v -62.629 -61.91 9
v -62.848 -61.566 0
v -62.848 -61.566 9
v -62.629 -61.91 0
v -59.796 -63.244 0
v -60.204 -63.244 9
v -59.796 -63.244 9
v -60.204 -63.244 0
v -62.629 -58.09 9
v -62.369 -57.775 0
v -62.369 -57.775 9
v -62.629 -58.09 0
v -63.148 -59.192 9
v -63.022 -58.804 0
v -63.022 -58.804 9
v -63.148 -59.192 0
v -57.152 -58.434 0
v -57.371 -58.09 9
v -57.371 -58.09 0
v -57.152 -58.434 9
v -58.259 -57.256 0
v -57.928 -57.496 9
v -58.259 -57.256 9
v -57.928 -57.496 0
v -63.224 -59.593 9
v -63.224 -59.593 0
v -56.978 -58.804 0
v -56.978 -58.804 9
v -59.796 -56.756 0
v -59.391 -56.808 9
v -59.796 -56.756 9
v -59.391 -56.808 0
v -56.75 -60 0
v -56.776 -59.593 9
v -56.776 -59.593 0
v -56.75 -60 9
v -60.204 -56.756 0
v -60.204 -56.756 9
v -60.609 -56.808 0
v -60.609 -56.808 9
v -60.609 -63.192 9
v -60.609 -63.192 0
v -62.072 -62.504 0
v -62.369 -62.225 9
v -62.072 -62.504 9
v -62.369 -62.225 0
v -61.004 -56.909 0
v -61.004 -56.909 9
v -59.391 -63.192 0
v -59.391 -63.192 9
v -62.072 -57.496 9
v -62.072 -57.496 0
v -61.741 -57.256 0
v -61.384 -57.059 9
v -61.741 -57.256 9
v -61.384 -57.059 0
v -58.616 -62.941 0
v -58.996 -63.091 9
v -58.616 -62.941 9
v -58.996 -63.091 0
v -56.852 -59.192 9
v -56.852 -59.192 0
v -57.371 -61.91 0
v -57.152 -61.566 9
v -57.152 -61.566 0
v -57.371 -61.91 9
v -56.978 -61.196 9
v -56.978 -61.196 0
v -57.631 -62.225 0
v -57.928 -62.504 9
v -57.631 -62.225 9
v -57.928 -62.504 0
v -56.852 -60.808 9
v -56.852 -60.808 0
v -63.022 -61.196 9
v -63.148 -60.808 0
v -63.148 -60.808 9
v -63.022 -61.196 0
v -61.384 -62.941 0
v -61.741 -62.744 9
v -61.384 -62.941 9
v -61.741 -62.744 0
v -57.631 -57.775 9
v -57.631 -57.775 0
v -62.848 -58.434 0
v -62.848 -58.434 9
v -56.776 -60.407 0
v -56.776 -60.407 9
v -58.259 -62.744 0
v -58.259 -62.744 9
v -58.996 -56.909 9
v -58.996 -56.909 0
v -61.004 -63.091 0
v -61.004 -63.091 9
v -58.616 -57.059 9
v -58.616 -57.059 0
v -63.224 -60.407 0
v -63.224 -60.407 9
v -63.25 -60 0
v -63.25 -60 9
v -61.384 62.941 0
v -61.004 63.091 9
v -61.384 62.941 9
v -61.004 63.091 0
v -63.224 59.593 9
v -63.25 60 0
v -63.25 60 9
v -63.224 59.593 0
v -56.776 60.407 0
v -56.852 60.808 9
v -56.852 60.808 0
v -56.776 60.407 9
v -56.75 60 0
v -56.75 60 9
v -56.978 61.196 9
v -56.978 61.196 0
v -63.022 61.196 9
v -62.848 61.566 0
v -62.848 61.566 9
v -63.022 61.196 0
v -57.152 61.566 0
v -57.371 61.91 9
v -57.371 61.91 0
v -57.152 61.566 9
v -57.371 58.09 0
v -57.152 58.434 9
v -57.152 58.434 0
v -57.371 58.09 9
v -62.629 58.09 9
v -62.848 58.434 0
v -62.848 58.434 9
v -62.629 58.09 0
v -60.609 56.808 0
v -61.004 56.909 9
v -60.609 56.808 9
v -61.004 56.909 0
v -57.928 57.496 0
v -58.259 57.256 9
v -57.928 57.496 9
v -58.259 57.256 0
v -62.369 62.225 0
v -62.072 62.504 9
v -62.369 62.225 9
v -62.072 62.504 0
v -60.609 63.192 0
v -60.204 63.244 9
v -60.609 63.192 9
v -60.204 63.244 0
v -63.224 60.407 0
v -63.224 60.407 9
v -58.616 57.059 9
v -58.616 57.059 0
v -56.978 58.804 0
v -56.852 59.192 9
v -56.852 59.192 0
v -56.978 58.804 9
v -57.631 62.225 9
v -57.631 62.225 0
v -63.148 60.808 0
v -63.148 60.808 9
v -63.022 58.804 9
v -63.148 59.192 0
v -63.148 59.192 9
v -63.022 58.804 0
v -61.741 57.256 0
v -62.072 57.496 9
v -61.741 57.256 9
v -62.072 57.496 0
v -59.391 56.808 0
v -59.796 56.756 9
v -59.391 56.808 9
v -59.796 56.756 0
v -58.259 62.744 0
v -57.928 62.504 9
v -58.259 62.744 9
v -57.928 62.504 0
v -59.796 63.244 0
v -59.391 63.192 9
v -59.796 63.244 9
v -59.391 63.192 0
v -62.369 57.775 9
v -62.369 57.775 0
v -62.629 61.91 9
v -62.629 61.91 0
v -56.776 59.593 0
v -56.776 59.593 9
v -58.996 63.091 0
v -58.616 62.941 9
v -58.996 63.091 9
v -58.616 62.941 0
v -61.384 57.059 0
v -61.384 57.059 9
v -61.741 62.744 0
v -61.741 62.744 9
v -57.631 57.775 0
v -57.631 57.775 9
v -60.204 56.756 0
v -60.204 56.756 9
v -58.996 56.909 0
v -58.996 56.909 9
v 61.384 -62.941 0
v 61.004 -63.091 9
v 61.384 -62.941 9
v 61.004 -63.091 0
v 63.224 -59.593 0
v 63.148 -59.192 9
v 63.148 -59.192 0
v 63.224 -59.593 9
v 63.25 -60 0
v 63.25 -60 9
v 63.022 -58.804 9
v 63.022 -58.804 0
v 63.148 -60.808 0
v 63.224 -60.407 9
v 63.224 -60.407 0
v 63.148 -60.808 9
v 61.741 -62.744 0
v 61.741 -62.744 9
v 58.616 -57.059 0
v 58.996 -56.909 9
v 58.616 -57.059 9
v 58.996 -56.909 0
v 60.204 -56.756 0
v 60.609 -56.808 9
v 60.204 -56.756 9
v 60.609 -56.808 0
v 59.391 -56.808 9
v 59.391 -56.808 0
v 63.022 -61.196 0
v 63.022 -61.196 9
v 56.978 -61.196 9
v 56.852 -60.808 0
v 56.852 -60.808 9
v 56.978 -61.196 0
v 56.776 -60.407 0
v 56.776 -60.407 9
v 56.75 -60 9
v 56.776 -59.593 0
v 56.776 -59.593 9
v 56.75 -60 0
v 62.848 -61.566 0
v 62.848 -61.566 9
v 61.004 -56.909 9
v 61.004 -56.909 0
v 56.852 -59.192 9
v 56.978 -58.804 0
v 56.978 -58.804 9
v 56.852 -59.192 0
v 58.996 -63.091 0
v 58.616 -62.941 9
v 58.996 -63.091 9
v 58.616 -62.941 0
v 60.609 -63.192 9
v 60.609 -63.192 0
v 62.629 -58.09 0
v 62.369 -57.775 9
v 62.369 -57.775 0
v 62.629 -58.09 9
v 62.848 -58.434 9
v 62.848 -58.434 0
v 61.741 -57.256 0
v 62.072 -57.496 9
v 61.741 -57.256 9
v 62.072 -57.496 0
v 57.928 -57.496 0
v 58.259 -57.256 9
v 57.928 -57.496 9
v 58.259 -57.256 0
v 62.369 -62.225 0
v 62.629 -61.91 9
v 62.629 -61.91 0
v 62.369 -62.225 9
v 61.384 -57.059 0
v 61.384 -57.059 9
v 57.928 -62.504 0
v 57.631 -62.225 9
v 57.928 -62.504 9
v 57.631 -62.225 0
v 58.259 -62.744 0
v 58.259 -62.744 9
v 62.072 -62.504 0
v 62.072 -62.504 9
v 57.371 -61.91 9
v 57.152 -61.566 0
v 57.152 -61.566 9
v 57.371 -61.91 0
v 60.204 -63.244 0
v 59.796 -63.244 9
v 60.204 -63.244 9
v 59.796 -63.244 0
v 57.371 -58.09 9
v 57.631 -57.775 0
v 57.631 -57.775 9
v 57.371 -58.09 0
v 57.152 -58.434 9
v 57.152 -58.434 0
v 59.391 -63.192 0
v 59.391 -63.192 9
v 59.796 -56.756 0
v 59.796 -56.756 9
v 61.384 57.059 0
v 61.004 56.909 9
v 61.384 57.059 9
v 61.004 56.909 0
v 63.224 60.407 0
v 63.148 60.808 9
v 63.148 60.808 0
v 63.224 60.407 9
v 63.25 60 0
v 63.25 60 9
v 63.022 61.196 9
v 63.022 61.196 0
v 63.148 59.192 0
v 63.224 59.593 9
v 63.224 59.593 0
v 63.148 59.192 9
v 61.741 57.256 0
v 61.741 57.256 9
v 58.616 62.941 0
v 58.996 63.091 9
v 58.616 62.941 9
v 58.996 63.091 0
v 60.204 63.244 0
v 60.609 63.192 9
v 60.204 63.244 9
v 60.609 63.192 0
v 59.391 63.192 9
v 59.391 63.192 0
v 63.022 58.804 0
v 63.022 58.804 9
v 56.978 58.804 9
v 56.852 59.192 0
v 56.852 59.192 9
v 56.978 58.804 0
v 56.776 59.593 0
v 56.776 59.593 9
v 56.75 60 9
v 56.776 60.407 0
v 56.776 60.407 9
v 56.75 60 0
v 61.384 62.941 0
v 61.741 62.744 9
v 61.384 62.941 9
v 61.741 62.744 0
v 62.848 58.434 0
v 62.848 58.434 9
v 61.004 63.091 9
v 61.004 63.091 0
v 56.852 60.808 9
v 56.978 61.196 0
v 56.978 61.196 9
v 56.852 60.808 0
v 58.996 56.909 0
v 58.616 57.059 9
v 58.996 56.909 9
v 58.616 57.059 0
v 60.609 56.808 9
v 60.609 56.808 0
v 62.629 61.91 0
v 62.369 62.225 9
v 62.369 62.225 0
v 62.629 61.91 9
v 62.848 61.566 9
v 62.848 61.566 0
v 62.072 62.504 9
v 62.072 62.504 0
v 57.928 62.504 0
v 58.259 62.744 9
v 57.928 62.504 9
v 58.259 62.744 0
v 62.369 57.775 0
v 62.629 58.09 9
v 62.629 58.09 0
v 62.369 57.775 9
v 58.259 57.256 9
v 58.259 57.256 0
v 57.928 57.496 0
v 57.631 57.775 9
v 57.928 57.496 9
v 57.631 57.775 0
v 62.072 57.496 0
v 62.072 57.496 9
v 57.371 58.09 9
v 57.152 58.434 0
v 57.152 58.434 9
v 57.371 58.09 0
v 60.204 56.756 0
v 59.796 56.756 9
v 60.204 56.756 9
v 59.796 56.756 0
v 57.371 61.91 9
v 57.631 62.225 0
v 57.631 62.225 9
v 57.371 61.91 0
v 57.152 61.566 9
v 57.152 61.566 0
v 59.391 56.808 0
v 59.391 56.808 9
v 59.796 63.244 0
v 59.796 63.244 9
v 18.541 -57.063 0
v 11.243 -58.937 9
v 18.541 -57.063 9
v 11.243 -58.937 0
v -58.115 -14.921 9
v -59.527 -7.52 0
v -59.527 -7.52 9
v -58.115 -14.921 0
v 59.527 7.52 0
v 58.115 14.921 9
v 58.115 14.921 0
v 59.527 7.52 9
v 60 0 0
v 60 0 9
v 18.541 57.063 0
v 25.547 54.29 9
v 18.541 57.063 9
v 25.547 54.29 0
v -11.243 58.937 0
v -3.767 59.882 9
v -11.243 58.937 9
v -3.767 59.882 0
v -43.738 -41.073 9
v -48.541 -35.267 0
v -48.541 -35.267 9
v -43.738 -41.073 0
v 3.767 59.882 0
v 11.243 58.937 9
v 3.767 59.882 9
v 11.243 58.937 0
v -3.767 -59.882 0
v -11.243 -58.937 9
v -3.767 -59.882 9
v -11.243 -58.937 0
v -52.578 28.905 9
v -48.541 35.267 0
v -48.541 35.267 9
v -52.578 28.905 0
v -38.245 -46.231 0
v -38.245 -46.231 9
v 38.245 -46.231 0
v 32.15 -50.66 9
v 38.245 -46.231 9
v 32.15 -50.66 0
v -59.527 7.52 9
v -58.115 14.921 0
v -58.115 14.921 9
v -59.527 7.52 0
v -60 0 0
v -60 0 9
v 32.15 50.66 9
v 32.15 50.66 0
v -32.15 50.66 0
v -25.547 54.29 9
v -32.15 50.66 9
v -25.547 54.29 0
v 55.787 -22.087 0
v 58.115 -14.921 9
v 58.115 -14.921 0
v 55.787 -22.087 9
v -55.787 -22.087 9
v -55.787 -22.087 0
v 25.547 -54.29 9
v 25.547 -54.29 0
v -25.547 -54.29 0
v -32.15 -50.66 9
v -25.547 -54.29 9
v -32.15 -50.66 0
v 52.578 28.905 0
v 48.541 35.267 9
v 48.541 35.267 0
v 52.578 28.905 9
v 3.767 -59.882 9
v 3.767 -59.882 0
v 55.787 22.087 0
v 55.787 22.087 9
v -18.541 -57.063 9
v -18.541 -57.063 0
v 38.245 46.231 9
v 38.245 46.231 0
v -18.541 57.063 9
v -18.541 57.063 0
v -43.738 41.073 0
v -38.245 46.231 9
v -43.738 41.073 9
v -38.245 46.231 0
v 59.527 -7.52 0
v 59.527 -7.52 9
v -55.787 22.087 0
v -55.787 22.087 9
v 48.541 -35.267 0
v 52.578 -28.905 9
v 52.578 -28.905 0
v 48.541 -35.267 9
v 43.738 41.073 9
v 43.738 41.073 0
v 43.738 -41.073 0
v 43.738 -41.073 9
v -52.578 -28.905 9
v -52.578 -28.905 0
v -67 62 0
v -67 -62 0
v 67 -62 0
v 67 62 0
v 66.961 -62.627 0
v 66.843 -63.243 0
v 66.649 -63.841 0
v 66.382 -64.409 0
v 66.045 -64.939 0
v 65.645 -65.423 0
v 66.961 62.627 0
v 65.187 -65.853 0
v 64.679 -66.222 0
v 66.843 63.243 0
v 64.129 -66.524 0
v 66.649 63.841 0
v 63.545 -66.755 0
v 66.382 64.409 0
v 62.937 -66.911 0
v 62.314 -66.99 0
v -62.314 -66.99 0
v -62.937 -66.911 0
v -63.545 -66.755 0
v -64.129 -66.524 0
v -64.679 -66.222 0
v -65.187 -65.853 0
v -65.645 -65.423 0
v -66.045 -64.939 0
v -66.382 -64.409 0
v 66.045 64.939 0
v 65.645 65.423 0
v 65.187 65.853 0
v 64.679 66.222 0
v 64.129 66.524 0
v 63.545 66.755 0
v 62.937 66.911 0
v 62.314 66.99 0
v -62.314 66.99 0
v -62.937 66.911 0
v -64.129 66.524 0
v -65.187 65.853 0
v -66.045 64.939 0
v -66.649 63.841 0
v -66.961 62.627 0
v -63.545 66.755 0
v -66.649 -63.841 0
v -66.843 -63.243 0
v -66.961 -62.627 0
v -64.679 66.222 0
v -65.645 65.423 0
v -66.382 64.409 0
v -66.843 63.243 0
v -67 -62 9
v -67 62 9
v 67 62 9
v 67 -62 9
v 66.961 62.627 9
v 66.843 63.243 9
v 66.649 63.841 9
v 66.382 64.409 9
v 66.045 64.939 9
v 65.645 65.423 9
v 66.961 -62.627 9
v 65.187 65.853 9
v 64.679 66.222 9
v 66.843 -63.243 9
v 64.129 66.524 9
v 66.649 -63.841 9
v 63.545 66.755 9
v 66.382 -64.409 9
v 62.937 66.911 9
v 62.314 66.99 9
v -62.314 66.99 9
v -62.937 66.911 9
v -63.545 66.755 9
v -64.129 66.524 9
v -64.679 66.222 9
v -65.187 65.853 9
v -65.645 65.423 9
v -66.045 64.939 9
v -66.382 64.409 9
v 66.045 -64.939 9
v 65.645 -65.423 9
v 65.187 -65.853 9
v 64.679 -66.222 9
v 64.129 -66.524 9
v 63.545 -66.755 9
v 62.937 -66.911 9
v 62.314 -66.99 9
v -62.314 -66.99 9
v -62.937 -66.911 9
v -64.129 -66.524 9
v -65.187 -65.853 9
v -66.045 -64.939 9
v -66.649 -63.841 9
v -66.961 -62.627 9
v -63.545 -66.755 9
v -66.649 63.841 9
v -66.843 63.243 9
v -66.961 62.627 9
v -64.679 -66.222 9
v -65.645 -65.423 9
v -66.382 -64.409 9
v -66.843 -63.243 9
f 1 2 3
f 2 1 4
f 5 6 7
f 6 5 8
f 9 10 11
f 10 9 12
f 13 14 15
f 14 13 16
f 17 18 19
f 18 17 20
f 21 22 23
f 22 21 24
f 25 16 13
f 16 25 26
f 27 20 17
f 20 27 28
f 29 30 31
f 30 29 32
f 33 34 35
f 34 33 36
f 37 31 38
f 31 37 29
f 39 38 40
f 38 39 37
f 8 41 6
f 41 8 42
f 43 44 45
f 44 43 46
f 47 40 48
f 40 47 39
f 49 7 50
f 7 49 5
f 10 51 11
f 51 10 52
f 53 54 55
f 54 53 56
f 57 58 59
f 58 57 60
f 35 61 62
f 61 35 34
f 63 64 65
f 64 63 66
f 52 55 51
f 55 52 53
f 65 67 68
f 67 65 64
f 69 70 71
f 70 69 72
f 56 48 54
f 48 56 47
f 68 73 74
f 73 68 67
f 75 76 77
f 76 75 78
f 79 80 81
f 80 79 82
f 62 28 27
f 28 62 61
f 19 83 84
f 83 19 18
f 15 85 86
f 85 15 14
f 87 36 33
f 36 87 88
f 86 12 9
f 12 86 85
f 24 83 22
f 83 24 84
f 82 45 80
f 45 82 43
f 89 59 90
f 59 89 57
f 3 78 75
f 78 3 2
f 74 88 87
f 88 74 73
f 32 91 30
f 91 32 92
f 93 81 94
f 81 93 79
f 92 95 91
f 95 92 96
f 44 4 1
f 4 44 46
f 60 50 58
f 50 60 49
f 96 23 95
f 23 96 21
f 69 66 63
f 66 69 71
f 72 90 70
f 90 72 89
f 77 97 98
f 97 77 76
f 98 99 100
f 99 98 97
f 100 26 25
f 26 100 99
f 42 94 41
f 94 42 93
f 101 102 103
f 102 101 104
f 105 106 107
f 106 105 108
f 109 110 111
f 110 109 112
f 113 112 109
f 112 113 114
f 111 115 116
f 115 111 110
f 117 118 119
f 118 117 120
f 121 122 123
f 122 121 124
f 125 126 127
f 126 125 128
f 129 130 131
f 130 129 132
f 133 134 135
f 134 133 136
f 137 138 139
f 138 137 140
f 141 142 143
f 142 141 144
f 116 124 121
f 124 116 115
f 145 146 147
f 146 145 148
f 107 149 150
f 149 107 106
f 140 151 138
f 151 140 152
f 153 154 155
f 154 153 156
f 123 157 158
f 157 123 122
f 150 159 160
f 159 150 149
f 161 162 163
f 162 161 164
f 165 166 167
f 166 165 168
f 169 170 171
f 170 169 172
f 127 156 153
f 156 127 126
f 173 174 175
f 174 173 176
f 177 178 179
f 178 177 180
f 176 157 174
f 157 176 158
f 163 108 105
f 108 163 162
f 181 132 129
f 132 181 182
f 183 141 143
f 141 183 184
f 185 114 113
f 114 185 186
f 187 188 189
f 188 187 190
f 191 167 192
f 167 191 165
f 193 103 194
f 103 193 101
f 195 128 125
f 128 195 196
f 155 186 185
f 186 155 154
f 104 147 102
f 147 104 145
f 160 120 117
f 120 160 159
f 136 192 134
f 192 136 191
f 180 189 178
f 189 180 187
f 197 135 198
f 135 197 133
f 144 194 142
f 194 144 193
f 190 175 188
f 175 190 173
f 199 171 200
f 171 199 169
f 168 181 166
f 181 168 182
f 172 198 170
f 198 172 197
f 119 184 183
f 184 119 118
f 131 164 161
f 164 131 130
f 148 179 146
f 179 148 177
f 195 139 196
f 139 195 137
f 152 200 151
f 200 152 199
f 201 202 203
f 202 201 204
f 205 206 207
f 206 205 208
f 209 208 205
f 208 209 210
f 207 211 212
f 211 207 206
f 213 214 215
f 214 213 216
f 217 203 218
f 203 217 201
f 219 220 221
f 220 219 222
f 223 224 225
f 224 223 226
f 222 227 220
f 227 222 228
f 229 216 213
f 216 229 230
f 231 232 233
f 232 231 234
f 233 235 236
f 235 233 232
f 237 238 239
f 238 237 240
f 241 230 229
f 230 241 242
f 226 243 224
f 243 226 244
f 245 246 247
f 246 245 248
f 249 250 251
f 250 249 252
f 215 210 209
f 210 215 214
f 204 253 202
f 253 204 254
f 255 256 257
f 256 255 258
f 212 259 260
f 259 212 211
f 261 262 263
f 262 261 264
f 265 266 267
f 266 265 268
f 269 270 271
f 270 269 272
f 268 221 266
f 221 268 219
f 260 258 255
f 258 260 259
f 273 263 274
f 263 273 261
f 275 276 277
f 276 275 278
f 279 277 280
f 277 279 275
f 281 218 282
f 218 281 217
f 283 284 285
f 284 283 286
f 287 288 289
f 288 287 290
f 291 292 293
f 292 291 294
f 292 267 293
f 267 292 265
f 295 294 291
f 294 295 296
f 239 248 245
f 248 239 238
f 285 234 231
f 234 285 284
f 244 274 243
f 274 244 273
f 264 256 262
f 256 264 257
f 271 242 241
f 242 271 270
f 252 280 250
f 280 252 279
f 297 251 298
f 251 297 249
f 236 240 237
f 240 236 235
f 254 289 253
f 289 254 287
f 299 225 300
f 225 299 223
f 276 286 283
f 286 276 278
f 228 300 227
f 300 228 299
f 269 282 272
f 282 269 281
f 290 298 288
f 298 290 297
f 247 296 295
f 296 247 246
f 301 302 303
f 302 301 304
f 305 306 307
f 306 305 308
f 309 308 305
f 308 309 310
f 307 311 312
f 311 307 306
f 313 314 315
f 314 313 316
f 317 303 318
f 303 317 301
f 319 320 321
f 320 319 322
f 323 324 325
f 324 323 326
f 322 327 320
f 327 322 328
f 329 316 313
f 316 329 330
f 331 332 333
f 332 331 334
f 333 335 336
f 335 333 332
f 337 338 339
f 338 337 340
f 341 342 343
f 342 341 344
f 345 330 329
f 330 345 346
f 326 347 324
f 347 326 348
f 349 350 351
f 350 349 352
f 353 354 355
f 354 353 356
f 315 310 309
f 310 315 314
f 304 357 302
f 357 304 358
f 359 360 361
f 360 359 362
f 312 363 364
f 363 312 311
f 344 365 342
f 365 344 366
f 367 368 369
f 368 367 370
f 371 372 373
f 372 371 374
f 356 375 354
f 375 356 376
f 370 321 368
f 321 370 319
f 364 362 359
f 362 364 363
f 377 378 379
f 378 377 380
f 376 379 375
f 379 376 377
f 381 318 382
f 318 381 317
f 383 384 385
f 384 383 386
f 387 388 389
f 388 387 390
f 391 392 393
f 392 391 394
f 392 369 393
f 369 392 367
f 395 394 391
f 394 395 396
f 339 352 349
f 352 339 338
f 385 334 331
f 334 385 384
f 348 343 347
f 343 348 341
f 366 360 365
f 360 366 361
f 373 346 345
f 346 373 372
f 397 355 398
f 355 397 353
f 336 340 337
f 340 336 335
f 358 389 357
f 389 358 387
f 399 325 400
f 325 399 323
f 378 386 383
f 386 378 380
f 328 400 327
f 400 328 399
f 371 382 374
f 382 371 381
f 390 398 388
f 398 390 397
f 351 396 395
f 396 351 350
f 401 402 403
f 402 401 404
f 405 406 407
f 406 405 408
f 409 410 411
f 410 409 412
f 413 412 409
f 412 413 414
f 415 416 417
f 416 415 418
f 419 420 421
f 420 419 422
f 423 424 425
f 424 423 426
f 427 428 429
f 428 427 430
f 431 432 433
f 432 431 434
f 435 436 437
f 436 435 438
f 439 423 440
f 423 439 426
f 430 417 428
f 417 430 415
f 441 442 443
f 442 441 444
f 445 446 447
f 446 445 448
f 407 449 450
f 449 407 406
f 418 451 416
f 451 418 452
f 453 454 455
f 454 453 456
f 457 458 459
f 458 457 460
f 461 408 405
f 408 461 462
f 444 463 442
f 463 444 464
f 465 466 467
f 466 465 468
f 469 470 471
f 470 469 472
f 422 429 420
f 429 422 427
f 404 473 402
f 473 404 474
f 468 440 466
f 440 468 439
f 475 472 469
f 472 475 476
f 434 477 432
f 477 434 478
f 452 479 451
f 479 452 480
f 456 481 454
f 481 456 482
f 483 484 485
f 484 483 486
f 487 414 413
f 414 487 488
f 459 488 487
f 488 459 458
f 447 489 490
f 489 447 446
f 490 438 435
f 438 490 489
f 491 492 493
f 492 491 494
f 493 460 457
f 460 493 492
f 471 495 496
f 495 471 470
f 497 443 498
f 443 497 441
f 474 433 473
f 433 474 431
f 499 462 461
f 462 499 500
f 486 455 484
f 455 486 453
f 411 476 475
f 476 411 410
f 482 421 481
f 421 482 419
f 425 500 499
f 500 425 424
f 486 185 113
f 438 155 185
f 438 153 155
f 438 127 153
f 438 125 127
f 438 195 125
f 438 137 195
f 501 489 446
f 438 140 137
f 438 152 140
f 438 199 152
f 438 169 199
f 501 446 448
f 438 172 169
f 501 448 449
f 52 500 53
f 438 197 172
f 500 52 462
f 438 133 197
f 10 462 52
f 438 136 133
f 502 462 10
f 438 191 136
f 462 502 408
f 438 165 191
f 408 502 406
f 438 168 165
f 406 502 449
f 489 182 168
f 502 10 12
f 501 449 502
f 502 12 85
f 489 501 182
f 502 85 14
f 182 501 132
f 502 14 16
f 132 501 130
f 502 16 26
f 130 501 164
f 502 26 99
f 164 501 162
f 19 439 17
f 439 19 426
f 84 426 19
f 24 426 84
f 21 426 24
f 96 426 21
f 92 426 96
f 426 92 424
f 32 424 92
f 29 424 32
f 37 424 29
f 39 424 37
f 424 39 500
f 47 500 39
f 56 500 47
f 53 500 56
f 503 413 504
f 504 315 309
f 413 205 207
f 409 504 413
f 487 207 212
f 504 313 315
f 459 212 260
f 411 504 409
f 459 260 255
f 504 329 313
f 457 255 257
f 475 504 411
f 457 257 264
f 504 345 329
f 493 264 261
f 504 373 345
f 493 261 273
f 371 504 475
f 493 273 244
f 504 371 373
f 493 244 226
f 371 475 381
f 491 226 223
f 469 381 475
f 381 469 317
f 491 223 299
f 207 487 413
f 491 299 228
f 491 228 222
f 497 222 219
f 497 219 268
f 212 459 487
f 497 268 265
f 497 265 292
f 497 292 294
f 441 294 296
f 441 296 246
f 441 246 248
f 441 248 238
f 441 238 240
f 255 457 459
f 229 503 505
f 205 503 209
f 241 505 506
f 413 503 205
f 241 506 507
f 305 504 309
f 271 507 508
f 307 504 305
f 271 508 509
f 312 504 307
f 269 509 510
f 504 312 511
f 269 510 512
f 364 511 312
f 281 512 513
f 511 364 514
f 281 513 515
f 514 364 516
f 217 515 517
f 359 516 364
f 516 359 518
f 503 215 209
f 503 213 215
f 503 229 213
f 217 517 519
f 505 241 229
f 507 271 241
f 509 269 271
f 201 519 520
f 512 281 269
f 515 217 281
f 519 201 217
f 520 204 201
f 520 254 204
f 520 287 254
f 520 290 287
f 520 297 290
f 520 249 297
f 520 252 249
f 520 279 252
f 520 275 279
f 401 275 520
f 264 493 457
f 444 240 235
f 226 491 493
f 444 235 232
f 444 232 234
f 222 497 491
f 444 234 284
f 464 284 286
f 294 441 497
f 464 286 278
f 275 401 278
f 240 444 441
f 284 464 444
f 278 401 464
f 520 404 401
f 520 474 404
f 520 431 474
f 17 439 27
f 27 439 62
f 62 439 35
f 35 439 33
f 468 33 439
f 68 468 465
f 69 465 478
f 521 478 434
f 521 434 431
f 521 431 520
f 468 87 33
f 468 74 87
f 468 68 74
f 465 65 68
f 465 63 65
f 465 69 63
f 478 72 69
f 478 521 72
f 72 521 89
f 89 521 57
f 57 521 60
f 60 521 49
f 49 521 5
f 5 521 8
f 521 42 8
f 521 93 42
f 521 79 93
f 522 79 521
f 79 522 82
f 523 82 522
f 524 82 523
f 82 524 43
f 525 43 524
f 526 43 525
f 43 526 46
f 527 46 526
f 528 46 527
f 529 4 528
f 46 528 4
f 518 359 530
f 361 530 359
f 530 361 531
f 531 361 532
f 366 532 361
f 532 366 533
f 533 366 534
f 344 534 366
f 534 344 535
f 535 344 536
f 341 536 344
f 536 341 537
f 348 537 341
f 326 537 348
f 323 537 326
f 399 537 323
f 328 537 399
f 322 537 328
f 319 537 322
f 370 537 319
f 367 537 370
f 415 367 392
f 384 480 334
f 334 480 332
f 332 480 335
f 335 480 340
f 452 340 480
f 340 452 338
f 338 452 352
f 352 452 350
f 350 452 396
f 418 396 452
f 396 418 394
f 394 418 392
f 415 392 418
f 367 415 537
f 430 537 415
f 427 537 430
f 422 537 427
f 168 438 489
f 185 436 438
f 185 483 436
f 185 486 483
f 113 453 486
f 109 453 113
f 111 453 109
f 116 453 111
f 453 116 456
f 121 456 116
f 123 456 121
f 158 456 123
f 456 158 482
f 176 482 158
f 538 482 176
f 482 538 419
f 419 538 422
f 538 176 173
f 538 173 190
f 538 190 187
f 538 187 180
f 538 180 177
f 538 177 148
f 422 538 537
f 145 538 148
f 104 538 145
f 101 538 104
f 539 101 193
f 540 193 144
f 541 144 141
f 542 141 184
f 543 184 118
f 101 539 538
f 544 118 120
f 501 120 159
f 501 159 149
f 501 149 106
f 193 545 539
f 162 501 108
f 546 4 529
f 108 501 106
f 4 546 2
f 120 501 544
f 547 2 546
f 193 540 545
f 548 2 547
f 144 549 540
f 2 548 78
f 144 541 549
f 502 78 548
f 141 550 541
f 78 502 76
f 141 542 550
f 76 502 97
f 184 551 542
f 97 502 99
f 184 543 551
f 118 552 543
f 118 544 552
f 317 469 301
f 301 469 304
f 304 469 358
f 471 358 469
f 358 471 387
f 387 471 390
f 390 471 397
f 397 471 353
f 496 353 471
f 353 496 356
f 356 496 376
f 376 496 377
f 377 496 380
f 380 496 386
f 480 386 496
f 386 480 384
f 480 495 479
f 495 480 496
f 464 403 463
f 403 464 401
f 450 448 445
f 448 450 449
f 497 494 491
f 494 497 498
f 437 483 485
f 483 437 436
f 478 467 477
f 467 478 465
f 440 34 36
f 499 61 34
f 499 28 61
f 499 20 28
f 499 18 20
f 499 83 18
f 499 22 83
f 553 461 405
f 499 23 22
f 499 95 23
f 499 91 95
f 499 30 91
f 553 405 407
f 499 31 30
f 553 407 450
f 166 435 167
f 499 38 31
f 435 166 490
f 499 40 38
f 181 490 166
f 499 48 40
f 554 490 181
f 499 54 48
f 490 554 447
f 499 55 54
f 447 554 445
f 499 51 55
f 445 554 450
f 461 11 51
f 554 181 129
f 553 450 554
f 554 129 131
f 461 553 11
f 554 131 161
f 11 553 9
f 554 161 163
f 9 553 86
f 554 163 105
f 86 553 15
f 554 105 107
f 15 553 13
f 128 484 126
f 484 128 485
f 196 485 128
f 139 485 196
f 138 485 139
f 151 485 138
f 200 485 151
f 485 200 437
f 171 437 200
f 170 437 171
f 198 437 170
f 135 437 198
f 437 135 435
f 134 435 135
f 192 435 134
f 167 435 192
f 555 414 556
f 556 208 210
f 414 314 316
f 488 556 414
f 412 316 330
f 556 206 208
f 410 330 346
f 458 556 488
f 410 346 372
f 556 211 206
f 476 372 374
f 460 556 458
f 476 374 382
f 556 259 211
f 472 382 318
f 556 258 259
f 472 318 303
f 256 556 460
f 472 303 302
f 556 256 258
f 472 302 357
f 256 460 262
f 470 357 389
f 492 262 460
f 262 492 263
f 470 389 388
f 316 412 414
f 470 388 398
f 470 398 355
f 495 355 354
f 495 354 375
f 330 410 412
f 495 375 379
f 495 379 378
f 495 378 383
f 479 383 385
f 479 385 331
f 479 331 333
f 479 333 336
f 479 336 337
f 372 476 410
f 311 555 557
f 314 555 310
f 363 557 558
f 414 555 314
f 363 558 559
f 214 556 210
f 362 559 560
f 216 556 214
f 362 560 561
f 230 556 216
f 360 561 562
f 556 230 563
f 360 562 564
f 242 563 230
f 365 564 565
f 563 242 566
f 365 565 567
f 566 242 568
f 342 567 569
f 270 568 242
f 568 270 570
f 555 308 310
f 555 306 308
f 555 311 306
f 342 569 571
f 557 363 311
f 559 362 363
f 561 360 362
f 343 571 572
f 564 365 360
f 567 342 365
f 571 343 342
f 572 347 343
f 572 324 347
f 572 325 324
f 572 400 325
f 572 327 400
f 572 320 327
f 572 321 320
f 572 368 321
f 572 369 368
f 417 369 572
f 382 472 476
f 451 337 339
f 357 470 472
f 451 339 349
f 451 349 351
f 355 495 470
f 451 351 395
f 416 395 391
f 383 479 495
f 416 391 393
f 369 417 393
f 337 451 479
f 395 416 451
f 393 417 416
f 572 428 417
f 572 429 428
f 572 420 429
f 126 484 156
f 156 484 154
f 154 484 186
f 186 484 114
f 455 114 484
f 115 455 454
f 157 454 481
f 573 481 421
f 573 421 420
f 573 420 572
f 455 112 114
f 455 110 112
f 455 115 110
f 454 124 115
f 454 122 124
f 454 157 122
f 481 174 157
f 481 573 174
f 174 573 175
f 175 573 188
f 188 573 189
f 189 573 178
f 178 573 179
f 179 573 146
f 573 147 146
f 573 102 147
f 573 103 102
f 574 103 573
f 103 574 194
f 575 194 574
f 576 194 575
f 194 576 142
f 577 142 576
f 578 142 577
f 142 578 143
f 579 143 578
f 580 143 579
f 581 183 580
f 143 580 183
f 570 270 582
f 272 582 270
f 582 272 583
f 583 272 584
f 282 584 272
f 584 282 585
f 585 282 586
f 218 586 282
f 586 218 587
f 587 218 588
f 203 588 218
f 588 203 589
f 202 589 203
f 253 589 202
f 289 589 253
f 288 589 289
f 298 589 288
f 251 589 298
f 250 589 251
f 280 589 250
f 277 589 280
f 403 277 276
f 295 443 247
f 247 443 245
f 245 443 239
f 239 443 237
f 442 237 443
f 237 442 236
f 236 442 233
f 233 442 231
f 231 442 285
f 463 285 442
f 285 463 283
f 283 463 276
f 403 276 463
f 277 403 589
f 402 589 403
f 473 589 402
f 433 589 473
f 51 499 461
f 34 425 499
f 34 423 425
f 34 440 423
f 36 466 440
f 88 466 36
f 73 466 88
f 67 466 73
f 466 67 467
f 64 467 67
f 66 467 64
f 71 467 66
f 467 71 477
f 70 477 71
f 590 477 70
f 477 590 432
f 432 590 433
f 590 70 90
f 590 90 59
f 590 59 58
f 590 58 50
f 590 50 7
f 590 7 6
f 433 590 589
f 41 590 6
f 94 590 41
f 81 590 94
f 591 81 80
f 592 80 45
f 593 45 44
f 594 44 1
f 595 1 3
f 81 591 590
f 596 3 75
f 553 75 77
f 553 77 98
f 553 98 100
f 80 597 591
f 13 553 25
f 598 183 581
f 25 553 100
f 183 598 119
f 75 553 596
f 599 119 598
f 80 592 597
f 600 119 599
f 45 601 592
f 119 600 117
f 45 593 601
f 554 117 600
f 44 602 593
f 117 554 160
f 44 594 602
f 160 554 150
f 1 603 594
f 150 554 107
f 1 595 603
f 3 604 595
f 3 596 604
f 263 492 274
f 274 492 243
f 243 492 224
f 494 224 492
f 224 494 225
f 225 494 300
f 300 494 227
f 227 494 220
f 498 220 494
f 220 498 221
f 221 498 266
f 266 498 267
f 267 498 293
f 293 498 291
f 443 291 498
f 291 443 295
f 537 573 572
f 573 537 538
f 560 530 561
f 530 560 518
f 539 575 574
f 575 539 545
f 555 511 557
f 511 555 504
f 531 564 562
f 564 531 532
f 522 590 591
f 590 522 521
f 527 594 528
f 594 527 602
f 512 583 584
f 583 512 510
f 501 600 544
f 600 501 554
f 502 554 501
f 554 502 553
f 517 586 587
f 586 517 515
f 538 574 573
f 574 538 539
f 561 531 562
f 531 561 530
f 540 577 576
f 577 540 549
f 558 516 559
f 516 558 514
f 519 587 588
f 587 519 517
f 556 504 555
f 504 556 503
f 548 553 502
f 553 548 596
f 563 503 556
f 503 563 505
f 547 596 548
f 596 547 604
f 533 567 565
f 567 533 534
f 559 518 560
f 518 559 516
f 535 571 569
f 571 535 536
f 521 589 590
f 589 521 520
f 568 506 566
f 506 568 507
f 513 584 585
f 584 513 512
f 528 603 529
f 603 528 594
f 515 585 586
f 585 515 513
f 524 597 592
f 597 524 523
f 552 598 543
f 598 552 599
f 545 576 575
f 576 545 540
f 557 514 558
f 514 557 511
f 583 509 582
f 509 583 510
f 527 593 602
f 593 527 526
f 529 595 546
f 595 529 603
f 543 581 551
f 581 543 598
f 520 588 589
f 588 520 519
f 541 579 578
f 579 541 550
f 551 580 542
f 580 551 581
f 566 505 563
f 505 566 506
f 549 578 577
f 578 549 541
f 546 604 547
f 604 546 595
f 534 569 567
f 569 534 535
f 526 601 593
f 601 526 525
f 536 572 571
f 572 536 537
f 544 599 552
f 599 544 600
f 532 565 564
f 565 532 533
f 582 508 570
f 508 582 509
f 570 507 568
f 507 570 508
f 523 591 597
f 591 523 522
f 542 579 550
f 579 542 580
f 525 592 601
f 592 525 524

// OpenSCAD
$fn = 50;


difference() {
	union() {
		hull() {
			translate(v = [-62.0000000000, 62.0000000000, 0]) {
				cylinder(h = 9, r = 5);
			}
			translate(v = [62.0000000000, 62.0000000000, 0]) {
				cylinder(h = 9, r = 5);
			}
			translate(v = [-62.0000000000, -62.0000000000, 0]) {
				cylinder(h = 9, r = 5);
			}
			translate(v = [62.0000000000, -62.0000000000, 0]) {
				cylinder(h = 9, r = 5);
			}
		}
	}
	union() {
		#translate(v = [-60.0000000000, -60.0000000000, -100.0000000000]) {
			cylinder(h = 200, r = 3.2500000000);
		}
		#translate(v = [-60.0000000000, 60.0000000000, -100.0000000000]) {
			cylinder(h = 200, r = 3.2500000000);
		}
		#translate(v = [60.0000000000, -60.0000000000, -100.0000000000]) {
			cylinder(h = 200, r = 3.2500000000);
		}
		#translate(v = [60.0000000000, 60.0000000000, -100.0000000000]) {
			cylinder(h = 200, r = 3.2500000000);
		}
		#cylinder(h = 9, r = 60.0000000000);
	}
}
